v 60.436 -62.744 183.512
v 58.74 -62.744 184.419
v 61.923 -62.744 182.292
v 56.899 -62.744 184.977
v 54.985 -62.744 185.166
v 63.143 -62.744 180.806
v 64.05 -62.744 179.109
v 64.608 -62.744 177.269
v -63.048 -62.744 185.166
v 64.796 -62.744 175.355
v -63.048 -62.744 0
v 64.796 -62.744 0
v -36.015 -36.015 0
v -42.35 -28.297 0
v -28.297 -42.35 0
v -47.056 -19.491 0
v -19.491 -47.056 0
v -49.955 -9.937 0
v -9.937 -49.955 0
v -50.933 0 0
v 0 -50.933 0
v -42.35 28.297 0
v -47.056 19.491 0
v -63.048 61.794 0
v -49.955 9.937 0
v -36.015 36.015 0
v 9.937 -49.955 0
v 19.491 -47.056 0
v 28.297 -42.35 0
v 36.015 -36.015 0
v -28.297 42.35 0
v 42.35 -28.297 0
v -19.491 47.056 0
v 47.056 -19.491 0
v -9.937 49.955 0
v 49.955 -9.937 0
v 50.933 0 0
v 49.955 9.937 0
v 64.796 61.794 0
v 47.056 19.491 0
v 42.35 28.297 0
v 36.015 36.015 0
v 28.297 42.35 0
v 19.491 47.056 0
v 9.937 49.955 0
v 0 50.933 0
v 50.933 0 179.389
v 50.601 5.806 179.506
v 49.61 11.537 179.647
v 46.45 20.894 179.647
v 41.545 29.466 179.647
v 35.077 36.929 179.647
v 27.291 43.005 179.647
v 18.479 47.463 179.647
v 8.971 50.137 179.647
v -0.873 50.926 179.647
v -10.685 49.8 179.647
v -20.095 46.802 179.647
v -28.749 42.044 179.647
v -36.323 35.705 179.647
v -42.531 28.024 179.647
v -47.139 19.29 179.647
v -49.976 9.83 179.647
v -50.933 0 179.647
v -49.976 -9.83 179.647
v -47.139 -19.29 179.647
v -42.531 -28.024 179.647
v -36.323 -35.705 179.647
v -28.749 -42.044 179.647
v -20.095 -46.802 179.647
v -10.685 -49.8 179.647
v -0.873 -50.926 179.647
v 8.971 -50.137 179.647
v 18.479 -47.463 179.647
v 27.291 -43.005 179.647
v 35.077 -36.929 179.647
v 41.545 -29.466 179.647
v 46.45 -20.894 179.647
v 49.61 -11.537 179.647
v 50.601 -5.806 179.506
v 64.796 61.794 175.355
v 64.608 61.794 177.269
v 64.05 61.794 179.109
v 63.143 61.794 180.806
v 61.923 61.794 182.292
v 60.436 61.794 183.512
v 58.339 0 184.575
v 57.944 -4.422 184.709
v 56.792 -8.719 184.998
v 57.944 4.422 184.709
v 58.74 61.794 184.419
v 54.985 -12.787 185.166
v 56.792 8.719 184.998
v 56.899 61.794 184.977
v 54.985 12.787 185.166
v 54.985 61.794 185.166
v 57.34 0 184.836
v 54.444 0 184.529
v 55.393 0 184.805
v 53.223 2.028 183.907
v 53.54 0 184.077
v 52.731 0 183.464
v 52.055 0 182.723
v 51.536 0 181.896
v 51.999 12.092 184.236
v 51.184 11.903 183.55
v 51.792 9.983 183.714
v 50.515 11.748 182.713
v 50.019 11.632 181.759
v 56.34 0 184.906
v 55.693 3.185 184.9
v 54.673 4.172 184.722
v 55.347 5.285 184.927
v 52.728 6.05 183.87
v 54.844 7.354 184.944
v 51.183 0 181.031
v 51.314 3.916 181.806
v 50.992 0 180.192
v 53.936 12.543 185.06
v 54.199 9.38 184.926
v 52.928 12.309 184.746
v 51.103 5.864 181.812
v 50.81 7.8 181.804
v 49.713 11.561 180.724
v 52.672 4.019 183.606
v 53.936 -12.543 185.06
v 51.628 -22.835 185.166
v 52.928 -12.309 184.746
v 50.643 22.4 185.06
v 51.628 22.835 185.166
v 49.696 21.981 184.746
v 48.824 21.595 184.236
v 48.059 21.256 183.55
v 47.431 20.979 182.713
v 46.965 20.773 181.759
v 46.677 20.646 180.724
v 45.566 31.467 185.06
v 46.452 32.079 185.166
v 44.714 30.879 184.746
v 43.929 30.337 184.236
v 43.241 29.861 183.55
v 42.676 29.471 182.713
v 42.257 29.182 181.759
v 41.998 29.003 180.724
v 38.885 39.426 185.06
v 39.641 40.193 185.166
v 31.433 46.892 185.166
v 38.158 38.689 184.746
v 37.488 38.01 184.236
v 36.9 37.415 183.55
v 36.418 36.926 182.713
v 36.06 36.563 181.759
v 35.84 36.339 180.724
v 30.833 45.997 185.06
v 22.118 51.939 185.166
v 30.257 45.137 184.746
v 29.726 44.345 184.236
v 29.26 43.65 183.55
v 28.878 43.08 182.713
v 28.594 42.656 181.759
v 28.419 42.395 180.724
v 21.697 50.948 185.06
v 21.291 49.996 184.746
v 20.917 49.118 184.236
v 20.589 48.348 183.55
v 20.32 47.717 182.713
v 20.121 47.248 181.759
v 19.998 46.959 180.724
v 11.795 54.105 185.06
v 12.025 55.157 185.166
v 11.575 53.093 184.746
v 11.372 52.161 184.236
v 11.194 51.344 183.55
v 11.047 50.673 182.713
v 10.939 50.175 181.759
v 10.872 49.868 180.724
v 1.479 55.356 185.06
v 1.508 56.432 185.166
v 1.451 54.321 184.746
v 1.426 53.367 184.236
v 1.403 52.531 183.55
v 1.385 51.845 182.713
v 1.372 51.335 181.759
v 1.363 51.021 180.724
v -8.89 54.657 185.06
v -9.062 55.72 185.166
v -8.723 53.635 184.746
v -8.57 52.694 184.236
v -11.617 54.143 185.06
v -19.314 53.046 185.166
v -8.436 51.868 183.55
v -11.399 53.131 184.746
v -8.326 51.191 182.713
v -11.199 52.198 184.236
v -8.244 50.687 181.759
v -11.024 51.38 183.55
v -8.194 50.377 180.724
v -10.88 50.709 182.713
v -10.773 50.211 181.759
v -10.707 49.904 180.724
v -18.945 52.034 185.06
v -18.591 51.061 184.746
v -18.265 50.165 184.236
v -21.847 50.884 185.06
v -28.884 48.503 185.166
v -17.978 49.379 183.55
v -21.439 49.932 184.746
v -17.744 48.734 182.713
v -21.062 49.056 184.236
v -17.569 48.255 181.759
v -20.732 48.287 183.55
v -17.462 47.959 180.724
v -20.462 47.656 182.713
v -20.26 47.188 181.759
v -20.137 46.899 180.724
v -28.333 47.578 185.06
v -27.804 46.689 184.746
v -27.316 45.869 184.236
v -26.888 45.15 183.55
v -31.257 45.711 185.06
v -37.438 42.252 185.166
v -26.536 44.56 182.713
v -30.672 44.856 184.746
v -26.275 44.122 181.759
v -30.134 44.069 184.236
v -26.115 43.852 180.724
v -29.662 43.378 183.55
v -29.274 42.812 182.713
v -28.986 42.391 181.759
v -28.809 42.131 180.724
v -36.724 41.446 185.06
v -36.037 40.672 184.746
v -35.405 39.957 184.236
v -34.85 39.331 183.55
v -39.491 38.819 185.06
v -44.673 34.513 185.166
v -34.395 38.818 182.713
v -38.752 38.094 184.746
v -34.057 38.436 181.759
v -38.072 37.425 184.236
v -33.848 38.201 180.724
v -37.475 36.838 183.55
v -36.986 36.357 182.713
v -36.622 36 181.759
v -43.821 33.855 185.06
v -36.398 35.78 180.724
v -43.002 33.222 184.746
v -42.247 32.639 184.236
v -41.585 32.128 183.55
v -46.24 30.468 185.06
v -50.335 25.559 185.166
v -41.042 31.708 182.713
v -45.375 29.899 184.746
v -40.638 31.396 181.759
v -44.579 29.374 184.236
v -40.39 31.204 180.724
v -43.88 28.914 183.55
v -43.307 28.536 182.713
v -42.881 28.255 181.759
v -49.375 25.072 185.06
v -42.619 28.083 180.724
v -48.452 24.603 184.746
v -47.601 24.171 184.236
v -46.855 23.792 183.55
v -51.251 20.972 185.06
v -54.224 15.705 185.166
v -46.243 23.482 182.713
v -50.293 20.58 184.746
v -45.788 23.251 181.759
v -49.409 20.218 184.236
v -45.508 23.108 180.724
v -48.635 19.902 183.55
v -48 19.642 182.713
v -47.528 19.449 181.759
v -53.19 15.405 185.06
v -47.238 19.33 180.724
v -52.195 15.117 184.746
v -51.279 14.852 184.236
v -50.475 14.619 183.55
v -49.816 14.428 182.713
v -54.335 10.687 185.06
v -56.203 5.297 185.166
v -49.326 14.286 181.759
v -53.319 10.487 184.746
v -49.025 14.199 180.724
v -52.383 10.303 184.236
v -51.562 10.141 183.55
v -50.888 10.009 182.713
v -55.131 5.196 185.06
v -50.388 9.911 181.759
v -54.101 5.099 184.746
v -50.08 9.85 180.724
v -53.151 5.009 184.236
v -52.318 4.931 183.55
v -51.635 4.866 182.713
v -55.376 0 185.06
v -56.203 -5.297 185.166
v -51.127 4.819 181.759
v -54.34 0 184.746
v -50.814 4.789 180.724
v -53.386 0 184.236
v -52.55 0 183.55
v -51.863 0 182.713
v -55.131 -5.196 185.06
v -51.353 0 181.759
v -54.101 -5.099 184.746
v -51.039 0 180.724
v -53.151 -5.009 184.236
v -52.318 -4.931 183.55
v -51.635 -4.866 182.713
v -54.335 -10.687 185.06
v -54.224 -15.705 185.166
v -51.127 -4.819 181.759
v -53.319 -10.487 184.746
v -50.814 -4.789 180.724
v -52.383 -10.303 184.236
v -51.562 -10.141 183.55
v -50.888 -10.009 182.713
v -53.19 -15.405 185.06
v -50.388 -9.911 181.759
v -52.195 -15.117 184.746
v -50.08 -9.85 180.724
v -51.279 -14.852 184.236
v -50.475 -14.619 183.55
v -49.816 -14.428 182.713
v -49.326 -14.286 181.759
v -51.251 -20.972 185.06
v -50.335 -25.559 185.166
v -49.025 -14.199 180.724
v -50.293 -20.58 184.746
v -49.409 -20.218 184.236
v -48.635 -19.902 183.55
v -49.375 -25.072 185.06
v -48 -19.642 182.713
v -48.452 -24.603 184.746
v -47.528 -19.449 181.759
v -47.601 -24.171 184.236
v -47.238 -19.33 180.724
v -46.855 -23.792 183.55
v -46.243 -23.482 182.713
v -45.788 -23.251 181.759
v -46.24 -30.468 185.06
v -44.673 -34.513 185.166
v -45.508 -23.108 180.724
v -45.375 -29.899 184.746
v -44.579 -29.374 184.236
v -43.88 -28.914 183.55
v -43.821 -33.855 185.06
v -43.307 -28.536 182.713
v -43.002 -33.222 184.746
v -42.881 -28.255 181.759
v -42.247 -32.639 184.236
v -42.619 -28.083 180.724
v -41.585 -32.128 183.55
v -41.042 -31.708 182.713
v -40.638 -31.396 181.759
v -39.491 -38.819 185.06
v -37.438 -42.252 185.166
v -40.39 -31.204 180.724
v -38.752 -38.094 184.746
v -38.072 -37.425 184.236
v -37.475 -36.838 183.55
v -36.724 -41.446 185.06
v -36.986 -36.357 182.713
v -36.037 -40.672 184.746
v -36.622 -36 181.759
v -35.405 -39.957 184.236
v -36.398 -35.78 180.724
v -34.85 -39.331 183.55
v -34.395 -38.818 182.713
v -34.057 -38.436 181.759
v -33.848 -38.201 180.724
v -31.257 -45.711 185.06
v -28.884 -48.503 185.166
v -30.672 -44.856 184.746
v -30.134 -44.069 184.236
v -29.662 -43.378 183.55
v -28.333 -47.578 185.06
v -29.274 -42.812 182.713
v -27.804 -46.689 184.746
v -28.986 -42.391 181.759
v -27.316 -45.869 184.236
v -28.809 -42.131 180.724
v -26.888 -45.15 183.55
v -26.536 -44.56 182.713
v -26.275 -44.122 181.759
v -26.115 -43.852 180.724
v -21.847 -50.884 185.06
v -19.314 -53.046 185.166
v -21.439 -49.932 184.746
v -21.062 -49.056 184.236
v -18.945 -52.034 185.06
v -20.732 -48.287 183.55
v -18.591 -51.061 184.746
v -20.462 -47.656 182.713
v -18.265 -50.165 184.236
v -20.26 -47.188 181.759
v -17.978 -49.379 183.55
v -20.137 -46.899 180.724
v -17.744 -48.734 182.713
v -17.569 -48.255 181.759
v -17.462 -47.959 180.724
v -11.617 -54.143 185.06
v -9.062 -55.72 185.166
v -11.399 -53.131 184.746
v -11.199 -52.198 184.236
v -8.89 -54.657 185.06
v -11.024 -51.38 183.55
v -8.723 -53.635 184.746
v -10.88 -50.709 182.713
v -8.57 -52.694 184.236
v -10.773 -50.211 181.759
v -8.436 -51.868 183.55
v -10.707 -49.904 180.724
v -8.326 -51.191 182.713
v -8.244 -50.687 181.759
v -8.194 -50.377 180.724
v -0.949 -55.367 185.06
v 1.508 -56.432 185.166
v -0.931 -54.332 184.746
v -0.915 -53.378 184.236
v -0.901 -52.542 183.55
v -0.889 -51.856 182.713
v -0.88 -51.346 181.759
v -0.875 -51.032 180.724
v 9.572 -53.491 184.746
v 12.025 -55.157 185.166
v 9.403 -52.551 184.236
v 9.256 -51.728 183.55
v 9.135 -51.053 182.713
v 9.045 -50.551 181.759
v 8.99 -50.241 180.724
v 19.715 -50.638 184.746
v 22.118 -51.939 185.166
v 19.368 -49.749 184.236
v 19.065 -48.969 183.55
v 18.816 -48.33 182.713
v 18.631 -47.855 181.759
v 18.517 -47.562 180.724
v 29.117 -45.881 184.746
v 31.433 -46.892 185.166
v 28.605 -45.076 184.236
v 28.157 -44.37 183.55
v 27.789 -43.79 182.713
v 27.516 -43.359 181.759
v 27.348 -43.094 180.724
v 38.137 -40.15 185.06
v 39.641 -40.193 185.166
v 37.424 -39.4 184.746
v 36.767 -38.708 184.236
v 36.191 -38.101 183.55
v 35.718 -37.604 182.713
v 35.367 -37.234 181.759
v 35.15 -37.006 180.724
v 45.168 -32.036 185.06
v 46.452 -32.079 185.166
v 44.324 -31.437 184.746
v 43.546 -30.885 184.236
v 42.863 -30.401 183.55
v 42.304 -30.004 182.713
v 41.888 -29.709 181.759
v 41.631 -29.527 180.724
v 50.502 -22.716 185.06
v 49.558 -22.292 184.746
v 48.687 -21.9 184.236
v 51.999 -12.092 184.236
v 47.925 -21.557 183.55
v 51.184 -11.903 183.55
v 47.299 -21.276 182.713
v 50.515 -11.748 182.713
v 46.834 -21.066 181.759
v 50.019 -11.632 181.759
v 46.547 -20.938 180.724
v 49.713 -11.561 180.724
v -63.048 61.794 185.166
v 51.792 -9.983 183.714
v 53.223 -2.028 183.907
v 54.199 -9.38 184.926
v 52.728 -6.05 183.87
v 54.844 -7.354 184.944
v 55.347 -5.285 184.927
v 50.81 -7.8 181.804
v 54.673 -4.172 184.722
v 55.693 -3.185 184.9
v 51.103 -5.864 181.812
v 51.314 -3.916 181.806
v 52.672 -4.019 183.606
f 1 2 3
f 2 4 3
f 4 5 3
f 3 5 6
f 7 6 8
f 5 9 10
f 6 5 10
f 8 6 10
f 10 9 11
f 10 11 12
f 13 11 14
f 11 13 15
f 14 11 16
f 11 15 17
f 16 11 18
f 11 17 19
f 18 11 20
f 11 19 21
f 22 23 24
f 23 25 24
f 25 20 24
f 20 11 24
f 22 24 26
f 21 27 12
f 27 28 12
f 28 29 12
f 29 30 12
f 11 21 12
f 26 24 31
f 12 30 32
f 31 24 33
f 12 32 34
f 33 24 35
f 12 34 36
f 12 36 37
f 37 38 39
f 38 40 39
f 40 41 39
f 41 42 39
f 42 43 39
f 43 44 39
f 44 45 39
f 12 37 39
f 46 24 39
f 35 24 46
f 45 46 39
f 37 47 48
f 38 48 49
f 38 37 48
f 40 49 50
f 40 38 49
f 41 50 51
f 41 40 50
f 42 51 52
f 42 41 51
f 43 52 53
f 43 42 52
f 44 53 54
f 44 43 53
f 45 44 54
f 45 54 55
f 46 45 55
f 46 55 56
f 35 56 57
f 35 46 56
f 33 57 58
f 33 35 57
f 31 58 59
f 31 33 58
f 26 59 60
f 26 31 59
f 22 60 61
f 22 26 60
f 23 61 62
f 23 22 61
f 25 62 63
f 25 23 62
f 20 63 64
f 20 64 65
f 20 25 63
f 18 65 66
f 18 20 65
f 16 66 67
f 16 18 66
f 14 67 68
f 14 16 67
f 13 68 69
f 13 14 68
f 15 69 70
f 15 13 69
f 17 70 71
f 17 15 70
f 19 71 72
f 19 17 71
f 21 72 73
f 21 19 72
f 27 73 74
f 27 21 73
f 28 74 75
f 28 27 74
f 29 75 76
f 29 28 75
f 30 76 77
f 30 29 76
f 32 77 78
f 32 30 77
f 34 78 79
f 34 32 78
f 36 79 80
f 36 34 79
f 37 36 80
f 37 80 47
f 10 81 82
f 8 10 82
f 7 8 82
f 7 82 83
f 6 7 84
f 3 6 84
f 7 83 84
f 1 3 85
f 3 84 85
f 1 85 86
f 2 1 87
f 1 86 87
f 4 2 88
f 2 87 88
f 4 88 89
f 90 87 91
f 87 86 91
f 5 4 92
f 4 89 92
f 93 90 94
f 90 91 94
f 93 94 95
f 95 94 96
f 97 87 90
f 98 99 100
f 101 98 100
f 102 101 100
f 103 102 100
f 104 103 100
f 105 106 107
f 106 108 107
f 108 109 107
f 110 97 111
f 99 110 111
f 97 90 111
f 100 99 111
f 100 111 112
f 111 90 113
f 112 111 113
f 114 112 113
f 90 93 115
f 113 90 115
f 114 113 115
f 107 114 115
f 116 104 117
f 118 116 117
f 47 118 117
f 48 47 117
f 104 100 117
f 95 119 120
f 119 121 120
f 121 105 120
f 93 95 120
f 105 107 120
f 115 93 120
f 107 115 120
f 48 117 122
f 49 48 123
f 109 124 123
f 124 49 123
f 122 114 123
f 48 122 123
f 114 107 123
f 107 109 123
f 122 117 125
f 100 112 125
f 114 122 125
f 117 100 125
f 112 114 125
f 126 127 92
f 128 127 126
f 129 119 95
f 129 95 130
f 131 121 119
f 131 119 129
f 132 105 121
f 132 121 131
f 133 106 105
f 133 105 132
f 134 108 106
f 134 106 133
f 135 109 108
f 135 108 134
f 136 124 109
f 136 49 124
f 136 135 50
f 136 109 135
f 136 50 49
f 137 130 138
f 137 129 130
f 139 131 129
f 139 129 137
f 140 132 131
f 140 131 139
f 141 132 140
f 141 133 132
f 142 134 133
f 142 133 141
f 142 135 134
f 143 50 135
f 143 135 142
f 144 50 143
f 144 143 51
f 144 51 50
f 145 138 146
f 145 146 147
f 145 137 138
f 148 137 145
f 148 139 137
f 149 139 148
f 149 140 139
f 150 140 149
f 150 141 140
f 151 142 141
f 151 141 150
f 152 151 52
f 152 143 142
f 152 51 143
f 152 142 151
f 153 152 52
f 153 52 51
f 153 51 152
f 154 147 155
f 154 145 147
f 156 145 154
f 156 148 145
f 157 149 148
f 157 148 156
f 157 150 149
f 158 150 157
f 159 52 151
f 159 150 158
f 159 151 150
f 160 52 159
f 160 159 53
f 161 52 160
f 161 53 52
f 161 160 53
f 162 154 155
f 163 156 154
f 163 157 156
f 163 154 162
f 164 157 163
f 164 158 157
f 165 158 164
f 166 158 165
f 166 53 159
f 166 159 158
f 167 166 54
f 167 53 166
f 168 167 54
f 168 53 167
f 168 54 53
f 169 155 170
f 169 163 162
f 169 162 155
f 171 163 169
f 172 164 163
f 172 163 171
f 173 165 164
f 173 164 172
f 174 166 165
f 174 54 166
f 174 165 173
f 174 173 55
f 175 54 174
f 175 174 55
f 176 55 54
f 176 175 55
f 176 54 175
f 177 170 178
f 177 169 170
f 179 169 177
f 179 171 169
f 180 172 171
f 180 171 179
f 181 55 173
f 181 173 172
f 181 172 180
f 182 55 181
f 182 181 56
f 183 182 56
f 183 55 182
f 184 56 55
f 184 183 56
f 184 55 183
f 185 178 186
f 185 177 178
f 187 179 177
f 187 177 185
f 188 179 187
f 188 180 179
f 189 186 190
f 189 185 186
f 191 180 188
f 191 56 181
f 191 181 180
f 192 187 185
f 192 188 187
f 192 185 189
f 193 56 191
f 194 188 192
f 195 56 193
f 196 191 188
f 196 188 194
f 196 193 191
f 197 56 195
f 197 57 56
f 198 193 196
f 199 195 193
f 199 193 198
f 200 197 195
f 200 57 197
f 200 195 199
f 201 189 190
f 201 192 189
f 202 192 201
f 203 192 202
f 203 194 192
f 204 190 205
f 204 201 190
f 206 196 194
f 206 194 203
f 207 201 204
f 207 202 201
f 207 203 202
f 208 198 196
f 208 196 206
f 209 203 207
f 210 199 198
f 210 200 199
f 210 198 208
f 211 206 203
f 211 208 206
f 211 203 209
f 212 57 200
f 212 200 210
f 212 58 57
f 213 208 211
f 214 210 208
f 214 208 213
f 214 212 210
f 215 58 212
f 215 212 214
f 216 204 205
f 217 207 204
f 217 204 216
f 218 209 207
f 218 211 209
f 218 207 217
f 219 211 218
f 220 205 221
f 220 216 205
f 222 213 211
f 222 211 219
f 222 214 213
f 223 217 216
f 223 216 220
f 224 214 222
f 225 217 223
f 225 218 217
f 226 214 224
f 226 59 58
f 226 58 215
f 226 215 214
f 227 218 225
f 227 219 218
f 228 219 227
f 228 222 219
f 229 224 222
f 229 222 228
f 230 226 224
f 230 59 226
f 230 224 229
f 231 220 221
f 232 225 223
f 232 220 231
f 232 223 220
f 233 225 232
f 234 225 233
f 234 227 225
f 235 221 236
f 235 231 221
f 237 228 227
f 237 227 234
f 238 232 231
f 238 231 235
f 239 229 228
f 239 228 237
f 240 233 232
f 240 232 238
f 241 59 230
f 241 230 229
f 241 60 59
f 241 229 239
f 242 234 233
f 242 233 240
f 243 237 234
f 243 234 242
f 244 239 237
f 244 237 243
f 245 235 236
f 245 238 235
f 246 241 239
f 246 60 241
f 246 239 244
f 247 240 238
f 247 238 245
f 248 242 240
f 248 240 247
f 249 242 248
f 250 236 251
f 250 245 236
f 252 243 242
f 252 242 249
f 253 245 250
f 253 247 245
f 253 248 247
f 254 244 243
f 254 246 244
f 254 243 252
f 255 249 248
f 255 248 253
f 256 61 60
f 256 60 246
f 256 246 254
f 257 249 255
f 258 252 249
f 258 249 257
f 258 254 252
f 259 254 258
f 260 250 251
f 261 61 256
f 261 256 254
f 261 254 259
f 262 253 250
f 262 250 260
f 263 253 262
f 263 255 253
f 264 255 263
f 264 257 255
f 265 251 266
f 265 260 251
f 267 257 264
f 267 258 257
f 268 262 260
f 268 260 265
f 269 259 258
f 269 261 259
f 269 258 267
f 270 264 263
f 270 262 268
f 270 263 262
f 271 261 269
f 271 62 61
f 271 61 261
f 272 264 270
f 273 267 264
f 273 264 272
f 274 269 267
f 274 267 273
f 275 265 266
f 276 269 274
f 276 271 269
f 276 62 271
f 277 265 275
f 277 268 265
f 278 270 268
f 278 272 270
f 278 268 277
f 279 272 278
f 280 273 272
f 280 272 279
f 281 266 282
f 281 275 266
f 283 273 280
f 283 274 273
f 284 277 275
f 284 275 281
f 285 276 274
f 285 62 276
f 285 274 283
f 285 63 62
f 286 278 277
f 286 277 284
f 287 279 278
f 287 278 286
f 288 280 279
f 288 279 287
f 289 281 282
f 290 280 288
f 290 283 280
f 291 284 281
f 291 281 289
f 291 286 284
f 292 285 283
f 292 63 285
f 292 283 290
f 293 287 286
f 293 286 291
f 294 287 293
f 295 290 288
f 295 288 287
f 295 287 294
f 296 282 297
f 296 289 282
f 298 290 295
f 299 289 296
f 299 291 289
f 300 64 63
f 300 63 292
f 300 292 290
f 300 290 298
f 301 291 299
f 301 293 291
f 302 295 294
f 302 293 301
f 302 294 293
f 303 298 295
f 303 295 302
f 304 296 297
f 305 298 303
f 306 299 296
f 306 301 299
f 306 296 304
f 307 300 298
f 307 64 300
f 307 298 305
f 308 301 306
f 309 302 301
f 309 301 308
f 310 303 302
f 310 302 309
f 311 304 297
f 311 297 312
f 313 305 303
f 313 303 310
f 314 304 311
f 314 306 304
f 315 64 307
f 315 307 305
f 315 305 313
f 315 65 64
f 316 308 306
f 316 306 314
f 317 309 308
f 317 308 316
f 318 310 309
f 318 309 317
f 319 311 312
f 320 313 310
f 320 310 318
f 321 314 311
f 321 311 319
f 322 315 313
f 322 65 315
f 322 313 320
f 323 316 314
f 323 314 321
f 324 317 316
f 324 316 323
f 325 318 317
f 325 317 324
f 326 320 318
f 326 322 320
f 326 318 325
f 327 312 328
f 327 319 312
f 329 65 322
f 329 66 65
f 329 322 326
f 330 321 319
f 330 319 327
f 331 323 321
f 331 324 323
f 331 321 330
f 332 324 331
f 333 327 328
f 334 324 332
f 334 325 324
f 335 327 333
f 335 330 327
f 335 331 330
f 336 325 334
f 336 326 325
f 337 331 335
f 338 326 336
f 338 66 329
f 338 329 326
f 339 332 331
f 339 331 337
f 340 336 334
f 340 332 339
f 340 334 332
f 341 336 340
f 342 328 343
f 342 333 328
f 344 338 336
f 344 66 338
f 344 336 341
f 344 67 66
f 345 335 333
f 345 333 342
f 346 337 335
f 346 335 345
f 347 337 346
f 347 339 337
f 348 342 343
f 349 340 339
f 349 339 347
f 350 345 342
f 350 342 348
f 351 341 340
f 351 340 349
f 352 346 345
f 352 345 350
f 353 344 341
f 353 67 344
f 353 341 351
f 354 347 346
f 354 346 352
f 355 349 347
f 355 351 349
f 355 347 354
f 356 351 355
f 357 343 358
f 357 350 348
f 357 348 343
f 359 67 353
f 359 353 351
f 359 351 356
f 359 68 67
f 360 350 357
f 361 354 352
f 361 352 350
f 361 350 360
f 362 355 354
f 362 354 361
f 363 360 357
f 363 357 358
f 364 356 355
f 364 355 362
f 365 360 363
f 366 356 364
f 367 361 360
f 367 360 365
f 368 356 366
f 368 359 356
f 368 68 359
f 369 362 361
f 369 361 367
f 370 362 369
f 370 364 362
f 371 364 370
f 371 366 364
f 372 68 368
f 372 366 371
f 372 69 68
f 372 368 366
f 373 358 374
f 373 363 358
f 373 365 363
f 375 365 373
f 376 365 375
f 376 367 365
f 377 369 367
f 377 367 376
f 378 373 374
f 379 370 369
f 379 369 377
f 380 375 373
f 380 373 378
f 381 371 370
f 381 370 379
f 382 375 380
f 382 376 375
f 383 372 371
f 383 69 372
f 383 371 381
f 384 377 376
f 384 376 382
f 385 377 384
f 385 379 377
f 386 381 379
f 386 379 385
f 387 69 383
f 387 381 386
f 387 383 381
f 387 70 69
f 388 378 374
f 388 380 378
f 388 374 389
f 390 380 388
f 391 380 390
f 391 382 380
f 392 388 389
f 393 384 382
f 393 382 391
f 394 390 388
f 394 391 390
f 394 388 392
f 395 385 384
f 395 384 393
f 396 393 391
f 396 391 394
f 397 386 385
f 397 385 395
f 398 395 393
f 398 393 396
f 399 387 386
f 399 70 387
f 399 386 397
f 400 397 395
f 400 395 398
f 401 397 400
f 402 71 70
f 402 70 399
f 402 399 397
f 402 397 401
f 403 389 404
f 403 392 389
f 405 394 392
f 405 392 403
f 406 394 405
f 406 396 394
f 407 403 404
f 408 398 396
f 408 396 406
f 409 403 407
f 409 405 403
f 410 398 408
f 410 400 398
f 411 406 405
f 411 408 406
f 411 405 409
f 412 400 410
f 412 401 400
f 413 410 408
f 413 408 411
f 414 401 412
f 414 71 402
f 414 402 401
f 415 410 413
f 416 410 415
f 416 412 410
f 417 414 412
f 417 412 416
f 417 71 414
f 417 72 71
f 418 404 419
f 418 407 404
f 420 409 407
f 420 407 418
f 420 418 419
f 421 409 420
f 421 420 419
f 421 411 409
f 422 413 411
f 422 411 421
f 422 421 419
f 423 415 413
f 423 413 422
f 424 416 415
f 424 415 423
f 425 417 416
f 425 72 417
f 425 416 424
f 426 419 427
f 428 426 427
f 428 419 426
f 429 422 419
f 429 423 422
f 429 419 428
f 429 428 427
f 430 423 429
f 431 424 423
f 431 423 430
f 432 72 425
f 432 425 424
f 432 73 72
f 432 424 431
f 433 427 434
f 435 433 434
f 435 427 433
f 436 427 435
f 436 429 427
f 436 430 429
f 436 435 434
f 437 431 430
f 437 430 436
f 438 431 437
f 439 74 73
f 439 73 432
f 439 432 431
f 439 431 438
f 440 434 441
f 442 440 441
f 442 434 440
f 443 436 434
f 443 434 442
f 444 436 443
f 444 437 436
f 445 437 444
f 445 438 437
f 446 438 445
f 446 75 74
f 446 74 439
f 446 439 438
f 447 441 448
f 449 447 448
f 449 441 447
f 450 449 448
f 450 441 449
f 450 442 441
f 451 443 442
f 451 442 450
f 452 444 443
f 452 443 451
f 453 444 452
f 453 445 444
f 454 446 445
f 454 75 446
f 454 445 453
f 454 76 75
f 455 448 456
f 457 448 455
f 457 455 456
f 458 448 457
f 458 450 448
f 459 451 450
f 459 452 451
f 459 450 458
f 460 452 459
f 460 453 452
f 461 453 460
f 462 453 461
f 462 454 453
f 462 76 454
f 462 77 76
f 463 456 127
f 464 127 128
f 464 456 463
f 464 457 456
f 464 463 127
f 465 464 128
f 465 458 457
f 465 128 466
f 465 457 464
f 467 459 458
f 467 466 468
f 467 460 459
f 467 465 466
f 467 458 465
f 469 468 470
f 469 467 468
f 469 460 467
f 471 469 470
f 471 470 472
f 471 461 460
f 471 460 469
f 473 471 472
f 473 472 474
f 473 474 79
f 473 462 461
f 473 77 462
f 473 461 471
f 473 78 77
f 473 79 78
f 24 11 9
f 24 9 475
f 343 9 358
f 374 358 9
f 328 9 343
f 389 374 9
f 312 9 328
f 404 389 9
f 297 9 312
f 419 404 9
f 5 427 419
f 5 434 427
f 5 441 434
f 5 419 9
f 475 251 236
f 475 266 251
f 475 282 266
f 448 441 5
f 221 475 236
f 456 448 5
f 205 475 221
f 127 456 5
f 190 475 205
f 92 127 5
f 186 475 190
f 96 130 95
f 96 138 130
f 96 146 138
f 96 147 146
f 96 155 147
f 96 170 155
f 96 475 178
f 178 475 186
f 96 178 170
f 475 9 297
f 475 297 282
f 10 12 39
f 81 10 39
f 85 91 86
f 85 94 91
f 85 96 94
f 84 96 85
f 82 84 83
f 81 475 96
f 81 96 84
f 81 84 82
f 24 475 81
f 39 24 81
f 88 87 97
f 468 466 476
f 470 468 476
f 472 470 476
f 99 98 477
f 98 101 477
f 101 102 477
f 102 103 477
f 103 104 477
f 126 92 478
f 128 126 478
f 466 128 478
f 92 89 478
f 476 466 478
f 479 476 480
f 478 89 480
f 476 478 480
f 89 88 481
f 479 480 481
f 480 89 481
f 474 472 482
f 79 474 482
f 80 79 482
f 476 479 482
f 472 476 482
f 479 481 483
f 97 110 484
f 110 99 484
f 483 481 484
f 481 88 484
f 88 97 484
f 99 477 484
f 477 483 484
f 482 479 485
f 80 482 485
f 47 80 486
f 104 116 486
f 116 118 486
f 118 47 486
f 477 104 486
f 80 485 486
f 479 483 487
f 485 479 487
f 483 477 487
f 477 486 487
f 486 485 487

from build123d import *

# Parameters (mm, degrees)
F0_W     = 127.844266
F0_H     = 124.537945
F0_R     = 50.933349
F1_DEPTH = 185.166
F2_R     = 9.811364
F3_R     = 5.518892


with BuildPart() as f1:
    # F0 (on Top) → F1 (new body)
    with BuildSketch(Plane.XY):
        with Locations((0.874225, -0.474699)):
            Rectangle(F0_W, F0_H)
        Circle(F0_R, mode=Mode.SUBTRACT)
    extrude(amount=F1_DEPTH)

    # F2
    f2_edges = [f1.edges().sort_by_distance(p)[0] for p in [
        (64.796358, -0.474699, 185.166),
    ]]
    fillet(f2_edges, radius=F2_R)

    # F3
    f3_edges = [f1.edges().sort_by_distance(p)[0] for p in [
        (-50.933349, 0, 185.166),
    ]]
    fillet(f3_edges, radius=F3_R)


solid = f1.part
